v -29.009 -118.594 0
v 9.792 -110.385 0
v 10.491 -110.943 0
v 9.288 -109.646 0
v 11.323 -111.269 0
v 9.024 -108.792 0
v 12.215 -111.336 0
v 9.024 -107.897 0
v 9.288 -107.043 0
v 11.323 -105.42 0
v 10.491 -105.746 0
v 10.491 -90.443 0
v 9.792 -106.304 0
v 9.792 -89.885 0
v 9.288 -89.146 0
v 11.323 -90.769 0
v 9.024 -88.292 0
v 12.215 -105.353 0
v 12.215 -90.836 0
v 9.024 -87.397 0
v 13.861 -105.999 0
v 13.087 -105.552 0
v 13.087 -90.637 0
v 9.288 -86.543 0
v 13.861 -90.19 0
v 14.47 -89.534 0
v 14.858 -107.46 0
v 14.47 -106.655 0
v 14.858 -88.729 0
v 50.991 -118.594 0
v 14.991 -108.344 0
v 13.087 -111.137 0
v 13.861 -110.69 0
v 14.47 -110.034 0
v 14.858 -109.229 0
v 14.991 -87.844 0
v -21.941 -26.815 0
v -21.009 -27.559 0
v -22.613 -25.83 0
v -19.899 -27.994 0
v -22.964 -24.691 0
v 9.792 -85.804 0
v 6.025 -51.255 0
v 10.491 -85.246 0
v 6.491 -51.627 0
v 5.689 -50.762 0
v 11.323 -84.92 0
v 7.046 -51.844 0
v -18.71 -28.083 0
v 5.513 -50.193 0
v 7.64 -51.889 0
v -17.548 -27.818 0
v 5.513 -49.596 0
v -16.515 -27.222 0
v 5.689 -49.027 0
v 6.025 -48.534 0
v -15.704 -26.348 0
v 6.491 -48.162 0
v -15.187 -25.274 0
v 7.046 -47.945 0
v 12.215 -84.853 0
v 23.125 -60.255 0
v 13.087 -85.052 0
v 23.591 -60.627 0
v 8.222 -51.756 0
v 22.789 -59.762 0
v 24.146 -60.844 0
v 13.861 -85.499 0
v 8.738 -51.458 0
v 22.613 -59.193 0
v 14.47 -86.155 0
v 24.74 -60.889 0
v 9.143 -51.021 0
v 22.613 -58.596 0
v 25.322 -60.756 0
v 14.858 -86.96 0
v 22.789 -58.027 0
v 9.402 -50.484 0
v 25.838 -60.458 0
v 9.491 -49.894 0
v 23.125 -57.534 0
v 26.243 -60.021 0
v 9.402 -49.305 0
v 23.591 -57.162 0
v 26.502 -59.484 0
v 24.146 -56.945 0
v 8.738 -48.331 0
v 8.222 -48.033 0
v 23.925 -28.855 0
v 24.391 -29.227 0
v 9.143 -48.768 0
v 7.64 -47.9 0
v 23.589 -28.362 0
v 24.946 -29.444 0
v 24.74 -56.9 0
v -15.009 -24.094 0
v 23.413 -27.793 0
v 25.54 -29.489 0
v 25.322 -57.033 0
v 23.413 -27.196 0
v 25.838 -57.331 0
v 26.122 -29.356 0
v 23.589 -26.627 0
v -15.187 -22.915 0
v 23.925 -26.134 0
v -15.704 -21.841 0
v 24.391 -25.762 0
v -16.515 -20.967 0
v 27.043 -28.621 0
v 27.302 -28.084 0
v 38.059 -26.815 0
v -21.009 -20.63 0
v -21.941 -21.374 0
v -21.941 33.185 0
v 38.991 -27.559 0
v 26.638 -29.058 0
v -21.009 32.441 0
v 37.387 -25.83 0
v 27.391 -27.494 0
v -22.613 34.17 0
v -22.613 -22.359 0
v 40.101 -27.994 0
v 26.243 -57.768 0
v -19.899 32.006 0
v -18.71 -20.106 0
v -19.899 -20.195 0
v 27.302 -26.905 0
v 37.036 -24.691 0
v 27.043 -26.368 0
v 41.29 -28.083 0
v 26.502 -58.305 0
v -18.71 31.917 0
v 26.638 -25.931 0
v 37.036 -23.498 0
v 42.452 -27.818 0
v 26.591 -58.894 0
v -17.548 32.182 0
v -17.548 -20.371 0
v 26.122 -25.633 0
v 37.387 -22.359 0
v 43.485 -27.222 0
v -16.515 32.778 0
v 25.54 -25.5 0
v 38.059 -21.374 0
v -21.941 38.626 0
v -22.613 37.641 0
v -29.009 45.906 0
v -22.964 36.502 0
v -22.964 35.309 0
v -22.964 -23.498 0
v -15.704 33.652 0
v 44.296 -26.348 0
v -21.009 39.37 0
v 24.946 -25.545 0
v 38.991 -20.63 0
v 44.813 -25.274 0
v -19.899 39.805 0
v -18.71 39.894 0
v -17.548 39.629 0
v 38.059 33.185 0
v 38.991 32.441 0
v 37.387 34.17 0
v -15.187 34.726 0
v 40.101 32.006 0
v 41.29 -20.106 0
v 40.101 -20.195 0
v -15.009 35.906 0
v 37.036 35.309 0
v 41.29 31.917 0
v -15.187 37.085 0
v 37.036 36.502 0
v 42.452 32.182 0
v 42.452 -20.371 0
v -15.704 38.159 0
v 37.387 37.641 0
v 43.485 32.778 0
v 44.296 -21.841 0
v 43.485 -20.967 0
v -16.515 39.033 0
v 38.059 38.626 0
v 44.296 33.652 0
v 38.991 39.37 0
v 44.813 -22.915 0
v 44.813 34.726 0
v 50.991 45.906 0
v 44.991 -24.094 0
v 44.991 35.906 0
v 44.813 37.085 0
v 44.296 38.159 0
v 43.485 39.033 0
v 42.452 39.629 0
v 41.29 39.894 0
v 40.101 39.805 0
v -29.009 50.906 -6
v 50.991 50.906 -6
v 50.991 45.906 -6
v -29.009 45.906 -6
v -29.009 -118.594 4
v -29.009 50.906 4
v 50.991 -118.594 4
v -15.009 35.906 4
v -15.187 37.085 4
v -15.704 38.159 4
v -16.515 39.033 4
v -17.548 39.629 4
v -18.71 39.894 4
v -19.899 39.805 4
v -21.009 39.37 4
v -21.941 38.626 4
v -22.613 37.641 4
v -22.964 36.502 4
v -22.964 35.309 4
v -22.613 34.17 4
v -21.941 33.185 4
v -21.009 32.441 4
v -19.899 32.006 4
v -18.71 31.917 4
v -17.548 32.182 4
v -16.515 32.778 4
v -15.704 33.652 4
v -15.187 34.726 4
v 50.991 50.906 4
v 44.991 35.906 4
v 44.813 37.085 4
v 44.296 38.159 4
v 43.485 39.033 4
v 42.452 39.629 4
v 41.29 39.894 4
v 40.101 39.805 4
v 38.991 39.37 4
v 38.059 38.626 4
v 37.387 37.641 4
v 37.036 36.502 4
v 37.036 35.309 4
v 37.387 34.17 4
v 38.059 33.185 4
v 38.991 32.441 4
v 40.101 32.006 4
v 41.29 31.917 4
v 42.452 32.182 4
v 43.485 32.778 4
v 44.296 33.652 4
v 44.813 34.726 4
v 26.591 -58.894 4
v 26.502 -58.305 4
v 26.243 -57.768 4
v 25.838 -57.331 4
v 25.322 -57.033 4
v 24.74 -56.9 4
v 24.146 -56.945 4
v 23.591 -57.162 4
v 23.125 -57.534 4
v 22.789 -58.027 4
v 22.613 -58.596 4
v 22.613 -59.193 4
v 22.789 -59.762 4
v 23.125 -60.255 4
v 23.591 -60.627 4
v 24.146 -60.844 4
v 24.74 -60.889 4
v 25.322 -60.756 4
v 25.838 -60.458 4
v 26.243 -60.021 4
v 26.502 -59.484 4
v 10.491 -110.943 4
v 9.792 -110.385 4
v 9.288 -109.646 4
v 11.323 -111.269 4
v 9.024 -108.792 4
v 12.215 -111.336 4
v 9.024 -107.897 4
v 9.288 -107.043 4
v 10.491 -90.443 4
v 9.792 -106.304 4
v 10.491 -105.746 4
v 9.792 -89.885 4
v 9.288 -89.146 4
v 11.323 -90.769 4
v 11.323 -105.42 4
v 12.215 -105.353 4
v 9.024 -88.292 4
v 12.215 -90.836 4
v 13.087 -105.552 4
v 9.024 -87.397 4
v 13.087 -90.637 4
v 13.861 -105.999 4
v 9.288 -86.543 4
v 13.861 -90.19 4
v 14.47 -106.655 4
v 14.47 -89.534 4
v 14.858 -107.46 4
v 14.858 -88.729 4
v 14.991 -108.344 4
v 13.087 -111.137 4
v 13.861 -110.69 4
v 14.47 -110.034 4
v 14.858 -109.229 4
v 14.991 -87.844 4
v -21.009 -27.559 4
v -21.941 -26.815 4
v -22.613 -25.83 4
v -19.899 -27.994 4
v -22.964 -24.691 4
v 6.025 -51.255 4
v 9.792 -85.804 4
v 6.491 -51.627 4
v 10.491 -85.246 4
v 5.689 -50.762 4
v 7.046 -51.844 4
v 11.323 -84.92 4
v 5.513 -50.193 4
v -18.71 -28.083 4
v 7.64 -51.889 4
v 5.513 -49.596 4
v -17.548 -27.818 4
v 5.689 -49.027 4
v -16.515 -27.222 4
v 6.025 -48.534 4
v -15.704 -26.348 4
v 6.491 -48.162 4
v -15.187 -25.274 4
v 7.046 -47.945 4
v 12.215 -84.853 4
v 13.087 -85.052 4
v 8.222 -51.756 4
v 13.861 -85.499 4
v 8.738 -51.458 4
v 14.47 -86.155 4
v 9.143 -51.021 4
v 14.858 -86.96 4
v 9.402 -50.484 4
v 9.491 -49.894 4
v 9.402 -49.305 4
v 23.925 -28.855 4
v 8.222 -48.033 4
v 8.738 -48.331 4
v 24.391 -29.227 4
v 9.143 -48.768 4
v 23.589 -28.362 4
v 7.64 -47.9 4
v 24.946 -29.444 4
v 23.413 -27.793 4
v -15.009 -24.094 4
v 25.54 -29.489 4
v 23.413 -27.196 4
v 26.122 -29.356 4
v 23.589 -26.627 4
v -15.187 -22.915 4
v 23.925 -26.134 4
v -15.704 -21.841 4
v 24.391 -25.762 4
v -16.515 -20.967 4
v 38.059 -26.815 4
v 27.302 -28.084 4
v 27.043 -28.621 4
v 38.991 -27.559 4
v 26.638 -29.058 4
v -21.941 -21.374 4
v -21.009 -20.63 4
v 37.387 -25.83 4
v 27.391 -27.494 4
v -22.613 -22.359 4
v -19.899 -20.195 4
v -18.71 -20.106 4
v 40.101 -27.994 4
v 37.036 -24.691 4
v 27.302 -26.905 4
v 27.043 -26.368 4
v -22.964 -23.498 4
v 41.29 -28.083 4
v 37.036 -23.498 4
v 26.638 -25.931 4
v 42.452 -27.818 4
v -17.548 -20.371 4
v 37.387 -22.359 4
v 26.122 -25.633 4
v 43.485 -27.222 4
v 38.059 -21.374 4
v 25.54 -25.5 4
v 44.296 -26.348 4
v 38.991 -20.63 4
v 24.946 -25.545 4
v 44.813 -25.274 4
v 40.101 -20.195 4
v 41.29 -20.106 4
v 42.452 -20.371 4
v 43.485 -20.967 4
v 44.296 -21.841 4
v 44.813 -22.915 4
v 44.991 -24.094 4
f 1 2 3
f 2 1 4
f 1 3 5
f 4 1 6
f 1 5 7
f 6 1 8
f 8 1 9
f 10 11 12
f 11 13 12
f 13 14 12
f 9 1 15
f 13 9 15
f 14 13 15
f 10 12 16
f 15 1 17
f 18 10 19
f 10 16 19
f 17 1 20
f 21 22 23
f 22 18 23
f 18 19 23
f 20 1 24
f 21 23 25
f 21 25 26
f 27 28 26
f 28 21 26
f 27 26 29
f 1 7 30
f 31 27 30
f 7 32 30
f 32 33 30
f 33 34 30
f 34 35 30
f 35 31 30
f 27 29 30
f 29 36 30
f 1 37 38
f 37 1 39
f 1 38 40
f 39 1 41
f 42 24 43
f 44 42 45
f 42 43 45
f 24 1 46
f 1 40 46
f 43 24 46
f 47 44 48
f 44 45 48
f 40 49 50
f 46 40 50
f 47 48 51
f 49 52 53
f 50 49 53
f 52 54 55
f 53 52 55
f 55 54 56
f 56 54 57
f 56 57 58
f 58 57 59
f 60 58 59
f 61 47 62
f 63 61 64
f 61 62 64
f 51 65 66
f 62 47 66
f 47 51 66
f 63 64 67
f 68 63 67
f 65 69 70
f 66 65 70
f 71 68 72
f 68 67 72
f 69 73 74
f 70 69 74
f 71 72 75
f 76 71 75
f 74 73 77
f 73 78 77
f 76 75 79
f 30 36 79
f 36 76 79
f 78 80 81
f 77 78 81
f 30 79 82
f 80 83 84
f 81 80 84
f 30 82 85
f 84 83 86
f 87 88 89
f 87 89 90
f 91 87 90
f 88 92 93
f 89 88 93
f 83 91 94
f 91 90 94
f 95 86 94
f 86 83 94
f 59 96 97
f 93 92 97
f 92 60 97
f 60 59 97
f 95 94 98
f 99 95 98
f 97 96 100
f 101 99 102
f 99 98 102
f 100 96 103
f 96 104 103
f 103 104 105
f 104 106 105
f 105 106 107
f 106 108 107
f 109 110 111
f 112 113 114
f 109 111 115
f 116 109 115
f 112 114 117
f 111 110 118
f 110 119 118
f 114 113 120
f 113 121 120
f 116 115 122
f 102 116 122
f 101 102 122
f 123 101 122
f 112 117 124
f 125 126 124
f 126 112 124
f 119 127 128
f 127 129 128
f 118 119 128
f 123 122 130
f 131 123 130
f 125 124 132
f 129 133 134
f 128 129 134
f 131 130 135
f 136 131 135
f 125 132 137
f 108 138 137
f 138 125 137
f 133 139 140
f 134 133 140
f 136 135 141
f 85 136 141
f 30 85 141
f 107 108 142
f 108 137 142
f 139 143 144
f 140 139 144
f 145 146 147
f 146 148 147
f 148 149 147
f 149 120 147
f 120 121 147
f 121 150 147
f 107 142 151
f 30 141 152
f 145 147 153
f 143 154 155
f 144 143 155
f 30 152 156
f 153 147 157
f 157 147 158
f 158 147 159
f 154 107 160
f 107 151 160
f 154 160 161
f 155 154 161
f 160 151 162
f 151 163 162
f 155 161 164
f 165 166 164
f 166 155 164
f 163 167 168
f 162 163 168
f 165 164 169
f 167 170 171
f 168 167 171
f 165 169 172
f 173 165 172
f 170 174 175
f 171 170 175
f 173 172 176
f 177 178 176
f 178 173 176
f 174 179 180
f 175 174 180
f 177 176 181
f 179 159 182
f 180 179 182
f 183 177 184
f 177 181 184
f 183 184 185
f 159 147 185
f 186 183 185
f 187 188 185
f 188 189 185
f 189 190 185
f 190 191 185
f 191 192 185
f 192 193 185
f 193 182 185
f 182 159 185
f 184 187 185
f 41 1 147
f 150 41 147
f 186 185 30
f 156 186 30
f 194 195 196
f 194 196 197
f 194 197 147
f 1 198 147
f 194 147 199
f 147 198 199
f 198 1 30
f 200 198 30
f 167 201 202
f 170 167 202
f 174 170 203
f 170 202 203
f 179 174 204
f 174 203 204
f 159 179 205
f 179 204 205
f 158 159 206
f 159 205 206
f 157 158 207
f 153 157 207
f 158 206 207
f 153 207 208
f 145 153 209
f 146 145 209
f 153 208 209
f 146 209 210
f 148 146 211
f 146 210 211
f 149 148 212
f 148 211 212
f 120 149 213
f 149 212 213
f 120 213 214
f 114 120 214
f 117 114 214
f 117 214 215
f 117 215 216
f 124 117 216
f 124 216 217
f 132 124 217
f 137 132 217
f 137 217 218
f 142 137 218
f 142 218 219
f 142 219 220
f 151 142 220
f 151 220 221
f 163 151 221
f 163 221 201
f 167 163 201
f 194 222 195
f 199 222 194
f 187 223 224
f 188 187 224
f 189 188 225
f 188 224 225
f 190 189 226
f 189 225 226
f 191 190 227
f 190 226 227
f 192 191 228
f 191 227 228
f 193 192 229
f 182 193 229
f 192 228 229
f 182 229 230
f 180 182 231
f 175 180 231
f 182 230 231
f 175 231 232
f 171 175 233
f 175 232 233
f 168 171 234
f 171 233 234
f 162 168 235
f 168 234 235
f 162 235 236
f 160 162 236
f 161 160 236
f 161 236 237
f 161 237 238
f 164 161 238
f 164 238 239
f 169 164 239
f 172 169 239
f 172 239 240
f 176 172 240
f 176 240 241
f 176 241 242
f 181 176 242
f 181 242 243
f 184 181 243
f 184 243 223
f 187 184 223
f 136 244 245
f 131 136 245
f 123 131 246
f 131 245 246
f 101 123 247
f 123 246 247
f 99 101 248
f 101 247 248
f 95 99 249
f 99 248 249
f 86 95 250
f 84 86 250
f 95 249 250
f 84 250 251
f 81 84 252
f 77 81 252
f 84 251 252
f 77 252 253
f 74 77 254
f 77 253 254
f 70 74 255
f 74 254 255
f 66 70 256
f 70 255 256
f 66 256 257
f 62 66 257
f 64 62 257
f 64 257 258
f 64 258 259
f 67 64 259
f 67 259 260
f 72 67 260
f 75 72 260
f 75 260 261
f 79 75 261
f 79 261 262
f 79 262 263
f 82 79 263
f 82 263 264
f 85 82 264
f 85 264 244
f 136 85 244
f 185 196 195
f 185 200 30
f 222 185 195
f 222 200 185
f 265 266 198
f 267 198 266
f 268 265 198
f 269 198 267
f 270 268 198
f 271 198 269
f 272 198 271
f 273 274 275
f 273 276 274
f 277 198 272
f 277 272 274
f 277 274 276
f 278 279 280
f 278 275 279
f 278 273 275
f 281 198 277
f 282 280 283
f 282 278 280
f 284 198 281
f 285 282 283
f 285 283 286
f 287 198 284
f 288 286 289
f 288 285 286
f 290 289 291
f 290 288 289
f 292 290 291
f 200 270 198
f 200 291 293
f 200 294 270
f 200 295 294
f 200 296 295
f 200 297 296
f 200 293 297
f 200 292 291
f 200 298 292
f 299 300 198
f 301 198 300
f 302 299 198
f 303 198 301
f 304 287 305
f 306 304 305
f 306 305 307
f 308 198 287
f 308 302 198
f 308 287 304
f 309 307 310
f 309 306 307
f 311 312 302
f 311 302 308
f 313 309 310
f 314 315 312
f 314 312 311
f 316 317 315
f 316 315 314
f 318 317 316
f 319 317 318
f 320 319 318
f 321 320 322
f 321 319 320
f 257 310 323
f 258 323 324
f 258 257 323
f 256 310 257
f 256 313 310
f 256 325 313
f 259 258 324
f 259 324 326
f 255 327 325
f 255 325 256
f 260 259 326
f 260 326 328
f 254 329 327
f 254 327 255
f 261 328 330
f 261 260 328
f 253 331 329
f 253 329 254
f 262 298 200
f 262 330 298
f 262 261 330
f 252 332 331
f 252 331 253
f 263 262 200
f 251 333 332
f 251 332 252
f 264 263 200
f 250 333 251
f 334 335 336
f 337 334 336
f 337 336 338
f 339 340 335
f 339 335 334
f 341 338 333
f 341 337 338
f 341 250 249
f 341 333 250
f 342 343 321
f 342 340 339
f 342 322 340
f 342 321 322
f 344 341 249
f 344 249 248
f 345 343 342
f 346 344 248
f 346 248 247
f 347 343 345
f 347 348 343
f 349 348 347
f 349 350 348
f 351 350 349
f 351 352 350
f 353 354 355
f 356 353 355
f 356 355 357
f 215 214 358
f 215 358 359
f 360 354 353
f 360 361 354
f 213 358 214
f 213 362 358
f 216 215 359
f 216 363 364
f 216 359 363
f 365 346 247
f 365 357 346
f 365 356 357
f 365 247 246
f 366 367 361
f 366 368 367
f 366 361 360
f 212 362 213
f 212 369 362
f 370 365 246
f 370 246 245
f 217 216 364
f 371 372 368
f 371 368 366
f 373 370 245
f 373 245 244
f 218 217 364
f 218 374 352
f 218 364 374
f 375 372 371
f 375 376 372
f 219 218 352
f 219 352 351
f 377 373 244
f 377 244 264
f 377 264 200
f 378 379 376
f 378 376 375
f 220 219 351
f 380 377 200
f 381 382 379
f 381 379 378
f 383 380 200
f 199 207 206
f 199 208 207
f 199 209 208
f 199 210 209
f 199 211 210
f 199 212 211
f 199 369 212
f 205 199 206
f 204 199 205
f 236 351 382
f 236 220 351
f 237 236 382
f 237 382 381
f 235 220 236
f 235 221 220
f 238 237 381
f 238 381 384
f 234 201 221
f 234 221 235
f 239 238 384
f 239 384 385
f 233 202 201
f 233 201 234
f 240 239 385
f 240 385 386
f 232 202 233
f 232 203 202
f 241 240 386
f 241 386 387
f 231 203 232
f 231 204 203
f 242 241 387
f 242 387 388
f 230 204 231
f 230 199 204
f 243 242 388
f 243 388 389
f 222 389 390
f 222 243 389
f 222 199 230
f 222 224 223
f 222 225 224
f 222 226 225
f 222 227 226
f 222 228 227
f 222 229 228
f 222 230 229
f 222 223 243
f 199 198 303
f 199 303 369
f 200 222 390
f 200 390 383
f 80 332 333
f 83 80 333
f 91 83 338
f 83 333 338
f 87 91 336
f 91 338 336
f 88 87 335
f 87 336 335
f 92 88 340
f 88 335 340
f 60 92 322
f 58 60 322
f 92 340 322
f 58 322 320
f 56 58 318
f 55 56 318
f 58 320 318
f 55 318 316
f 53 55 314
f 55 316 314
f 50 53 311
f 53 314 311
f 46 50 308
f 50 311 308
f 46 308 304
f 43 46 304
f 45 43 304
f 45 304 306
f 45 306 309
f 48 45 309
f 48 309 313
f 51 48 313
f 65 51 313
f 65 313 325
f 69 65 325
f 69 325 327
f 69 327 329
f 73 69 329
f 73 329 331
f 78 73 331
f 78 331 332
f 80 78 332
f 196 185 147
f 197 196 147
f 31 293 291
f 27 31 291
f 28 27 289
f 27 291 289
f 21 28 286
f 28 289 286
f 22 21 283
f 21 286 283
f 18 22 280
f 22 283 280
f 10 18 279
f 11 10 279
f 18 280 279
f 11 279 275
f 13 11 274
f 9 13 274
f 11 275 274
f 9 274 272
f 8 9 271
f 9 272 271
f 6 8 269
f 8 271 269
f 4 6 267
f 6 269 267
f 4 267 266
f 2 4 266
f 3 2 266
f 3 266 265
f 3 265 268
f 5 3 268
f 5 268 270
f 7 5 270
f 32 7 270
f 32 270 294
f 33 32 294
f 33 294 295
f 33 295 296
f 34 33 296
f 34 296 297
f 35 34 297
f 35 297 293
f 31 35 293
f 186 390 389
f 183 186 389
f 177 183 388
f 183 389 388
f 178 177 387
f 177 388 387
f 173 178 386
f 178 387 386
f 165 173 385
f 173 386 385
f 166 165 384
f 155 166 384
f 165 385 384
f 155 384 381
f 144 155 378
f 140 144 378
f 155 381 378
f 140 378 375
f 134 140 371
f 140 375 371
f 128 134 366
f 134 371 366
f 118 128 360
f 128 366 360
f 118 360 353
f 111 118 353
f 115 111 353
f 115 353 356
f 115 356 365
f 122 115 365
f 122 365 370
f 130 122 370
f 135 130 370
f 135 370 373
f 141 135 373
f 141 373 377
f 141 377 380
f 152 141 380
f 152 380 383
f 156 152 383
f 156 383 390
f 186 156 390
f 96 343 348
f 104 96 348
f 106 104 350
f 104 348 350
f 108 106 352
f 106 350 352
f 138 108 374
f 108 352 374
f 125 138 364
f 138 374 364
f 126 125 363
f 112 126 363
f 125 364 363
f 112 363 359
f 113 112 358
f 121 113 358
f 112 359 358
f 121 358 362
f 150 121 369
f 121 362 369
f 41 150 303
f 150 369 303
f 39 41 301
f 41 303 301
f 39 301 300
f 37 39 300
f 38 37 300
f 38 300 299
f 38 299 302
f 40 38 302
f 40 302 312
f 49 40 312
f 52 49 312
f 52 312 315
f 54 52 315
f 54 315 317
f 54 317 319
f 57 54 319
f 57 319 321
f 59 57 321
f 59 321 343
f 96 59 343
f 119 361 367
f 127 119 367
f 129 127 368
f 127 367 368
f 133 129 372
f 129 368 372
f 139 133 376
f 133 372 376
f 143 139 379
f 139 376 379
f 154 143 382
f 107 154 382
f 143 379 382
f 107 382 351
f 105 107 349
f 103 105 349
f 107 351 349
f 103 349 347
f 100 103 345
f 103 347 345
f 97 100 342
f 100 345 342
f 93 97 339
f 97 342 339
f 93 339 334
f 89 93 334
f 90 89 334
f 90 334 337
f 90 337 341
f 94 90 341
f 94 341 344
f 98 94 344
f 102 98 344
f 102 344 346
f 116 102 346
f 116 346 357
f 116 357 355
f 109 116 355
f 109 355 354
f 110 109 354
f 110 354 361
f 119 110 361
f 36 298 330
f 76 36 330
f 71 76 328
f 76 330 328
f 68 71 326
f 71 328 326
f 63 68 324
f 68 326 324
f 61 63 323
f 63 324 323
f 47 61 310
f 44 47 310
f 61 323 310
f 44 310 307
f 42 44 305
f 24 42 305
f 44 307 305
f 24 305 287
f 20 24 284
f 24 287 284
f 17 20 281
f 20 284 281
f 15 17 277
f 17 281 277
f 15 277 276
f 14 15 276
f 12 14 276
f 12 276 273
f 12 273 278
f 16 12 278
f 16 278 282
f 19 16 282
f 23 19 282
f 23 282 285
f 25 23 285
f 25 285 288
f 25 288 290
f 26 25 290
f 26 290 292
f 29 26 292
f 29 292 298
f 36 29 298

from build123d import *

# Parameters (mm, degrees)
ESQUISSE1_W             = 80
ESQUISSE1_H             = 169.5
BOSS_EXTRU_1_DEPTH      = 4
ESQUISSE2_R             = 4
ENL_V_MAT_EXTRU_1_DEPTH = 5
ESQUISSE5_R             = 3
ENL_V_MAT_EXTRU_2_DEPTH = 5
ESQUISSE6_W             = 80
ESQUISSE6_H             = 5
BOSS_EXTRU_2_DEPTH      = 6
ESQUISSE7_R             = 2
ENL_V_MAT_EXTRU_5_DEPTH = 11


with BuildPart() as part:
    # Esquisse1 → Boss.-Extru.1 (new body)
    with BuildSketch(Plane.XY):
        with Locations((10.990966959, -33.844488189)):
            Rectangle(ESQUISSE1_W, ESQUISSE1_H)
    extrude(amount=BOSS_EXTRU_1_DEPTH)

    # Esquisse2 → Enlèv. mat.-Extru.1 (cut, through all)
    with BuildSketch(Plane.XY.offset(4)):
        with Locations((-19.009033041, 35.905511811)):
            Circle(ESQUISSE2_R)
        with Locations((40.990966959, 35.905511811)):
            Circle(ESQUISSE2_R)
        with Locations((-19.009033041, -24.094488189)):
            Circle(ESQUISSE2_R)
        with Locations((40.990966959, -24.094488189)):
            Circle(ESQUISSE2_R)
    extrude(amount=-ENL_V_MAT_EXTRU_1_DEPTH, mode=Mode.SUBTRACT)

    # Esquisse5 → Enlèv. mat.-Extru.2 (cut, through all)
    with BuildSketch(Plane.XY.offset(4)):
        with Locations((11.990966959, -108.344488189)):
            Circle(ESQUISSE5_R)
        with Locations((11.990966959, -87.844488189)):
            Circle(ESQUISSE5_R)
    extrude(amount=-ENL_V_MAT_EXTRU_2_DEPTH, mode=Mode.SUBTRACT)

    # Esquisse6 → Boss.-Extru.2 (add)
    with BuildSketch(Plane(origin=(0, 0, 0), x_dir=(-1, 0, 0), z_dir=(0, 0, -1))):
        with Locations((-10.990966959, 48.405511811)):
            Rectangle(ESQUISSE6_W, ESQUISSE6_H)
    extrude(amount=BOSS_EXTRU_2_DEPTH)

    # Esquisse7 → Enlèv. mat.-Extru.5 (cut, through all)
    with BuildSketch(Plane.XY.offset(4)):
        with Locations((7.490966959, -49.894488189)):
            Circle(ESQUISSE7_R)
        with Locations((25.390966959, -27.494488189)):
            Circle(ESQUISSE7_R)
        with Locations((24.590966959, -58.894488189)):
            Circle(ESQUISSE7_R)
    extrude(amount=-ENL_V_MAT_EXTRU_5_DEPTH, mode=Mode.SUBTRACT)


solid = part.part
